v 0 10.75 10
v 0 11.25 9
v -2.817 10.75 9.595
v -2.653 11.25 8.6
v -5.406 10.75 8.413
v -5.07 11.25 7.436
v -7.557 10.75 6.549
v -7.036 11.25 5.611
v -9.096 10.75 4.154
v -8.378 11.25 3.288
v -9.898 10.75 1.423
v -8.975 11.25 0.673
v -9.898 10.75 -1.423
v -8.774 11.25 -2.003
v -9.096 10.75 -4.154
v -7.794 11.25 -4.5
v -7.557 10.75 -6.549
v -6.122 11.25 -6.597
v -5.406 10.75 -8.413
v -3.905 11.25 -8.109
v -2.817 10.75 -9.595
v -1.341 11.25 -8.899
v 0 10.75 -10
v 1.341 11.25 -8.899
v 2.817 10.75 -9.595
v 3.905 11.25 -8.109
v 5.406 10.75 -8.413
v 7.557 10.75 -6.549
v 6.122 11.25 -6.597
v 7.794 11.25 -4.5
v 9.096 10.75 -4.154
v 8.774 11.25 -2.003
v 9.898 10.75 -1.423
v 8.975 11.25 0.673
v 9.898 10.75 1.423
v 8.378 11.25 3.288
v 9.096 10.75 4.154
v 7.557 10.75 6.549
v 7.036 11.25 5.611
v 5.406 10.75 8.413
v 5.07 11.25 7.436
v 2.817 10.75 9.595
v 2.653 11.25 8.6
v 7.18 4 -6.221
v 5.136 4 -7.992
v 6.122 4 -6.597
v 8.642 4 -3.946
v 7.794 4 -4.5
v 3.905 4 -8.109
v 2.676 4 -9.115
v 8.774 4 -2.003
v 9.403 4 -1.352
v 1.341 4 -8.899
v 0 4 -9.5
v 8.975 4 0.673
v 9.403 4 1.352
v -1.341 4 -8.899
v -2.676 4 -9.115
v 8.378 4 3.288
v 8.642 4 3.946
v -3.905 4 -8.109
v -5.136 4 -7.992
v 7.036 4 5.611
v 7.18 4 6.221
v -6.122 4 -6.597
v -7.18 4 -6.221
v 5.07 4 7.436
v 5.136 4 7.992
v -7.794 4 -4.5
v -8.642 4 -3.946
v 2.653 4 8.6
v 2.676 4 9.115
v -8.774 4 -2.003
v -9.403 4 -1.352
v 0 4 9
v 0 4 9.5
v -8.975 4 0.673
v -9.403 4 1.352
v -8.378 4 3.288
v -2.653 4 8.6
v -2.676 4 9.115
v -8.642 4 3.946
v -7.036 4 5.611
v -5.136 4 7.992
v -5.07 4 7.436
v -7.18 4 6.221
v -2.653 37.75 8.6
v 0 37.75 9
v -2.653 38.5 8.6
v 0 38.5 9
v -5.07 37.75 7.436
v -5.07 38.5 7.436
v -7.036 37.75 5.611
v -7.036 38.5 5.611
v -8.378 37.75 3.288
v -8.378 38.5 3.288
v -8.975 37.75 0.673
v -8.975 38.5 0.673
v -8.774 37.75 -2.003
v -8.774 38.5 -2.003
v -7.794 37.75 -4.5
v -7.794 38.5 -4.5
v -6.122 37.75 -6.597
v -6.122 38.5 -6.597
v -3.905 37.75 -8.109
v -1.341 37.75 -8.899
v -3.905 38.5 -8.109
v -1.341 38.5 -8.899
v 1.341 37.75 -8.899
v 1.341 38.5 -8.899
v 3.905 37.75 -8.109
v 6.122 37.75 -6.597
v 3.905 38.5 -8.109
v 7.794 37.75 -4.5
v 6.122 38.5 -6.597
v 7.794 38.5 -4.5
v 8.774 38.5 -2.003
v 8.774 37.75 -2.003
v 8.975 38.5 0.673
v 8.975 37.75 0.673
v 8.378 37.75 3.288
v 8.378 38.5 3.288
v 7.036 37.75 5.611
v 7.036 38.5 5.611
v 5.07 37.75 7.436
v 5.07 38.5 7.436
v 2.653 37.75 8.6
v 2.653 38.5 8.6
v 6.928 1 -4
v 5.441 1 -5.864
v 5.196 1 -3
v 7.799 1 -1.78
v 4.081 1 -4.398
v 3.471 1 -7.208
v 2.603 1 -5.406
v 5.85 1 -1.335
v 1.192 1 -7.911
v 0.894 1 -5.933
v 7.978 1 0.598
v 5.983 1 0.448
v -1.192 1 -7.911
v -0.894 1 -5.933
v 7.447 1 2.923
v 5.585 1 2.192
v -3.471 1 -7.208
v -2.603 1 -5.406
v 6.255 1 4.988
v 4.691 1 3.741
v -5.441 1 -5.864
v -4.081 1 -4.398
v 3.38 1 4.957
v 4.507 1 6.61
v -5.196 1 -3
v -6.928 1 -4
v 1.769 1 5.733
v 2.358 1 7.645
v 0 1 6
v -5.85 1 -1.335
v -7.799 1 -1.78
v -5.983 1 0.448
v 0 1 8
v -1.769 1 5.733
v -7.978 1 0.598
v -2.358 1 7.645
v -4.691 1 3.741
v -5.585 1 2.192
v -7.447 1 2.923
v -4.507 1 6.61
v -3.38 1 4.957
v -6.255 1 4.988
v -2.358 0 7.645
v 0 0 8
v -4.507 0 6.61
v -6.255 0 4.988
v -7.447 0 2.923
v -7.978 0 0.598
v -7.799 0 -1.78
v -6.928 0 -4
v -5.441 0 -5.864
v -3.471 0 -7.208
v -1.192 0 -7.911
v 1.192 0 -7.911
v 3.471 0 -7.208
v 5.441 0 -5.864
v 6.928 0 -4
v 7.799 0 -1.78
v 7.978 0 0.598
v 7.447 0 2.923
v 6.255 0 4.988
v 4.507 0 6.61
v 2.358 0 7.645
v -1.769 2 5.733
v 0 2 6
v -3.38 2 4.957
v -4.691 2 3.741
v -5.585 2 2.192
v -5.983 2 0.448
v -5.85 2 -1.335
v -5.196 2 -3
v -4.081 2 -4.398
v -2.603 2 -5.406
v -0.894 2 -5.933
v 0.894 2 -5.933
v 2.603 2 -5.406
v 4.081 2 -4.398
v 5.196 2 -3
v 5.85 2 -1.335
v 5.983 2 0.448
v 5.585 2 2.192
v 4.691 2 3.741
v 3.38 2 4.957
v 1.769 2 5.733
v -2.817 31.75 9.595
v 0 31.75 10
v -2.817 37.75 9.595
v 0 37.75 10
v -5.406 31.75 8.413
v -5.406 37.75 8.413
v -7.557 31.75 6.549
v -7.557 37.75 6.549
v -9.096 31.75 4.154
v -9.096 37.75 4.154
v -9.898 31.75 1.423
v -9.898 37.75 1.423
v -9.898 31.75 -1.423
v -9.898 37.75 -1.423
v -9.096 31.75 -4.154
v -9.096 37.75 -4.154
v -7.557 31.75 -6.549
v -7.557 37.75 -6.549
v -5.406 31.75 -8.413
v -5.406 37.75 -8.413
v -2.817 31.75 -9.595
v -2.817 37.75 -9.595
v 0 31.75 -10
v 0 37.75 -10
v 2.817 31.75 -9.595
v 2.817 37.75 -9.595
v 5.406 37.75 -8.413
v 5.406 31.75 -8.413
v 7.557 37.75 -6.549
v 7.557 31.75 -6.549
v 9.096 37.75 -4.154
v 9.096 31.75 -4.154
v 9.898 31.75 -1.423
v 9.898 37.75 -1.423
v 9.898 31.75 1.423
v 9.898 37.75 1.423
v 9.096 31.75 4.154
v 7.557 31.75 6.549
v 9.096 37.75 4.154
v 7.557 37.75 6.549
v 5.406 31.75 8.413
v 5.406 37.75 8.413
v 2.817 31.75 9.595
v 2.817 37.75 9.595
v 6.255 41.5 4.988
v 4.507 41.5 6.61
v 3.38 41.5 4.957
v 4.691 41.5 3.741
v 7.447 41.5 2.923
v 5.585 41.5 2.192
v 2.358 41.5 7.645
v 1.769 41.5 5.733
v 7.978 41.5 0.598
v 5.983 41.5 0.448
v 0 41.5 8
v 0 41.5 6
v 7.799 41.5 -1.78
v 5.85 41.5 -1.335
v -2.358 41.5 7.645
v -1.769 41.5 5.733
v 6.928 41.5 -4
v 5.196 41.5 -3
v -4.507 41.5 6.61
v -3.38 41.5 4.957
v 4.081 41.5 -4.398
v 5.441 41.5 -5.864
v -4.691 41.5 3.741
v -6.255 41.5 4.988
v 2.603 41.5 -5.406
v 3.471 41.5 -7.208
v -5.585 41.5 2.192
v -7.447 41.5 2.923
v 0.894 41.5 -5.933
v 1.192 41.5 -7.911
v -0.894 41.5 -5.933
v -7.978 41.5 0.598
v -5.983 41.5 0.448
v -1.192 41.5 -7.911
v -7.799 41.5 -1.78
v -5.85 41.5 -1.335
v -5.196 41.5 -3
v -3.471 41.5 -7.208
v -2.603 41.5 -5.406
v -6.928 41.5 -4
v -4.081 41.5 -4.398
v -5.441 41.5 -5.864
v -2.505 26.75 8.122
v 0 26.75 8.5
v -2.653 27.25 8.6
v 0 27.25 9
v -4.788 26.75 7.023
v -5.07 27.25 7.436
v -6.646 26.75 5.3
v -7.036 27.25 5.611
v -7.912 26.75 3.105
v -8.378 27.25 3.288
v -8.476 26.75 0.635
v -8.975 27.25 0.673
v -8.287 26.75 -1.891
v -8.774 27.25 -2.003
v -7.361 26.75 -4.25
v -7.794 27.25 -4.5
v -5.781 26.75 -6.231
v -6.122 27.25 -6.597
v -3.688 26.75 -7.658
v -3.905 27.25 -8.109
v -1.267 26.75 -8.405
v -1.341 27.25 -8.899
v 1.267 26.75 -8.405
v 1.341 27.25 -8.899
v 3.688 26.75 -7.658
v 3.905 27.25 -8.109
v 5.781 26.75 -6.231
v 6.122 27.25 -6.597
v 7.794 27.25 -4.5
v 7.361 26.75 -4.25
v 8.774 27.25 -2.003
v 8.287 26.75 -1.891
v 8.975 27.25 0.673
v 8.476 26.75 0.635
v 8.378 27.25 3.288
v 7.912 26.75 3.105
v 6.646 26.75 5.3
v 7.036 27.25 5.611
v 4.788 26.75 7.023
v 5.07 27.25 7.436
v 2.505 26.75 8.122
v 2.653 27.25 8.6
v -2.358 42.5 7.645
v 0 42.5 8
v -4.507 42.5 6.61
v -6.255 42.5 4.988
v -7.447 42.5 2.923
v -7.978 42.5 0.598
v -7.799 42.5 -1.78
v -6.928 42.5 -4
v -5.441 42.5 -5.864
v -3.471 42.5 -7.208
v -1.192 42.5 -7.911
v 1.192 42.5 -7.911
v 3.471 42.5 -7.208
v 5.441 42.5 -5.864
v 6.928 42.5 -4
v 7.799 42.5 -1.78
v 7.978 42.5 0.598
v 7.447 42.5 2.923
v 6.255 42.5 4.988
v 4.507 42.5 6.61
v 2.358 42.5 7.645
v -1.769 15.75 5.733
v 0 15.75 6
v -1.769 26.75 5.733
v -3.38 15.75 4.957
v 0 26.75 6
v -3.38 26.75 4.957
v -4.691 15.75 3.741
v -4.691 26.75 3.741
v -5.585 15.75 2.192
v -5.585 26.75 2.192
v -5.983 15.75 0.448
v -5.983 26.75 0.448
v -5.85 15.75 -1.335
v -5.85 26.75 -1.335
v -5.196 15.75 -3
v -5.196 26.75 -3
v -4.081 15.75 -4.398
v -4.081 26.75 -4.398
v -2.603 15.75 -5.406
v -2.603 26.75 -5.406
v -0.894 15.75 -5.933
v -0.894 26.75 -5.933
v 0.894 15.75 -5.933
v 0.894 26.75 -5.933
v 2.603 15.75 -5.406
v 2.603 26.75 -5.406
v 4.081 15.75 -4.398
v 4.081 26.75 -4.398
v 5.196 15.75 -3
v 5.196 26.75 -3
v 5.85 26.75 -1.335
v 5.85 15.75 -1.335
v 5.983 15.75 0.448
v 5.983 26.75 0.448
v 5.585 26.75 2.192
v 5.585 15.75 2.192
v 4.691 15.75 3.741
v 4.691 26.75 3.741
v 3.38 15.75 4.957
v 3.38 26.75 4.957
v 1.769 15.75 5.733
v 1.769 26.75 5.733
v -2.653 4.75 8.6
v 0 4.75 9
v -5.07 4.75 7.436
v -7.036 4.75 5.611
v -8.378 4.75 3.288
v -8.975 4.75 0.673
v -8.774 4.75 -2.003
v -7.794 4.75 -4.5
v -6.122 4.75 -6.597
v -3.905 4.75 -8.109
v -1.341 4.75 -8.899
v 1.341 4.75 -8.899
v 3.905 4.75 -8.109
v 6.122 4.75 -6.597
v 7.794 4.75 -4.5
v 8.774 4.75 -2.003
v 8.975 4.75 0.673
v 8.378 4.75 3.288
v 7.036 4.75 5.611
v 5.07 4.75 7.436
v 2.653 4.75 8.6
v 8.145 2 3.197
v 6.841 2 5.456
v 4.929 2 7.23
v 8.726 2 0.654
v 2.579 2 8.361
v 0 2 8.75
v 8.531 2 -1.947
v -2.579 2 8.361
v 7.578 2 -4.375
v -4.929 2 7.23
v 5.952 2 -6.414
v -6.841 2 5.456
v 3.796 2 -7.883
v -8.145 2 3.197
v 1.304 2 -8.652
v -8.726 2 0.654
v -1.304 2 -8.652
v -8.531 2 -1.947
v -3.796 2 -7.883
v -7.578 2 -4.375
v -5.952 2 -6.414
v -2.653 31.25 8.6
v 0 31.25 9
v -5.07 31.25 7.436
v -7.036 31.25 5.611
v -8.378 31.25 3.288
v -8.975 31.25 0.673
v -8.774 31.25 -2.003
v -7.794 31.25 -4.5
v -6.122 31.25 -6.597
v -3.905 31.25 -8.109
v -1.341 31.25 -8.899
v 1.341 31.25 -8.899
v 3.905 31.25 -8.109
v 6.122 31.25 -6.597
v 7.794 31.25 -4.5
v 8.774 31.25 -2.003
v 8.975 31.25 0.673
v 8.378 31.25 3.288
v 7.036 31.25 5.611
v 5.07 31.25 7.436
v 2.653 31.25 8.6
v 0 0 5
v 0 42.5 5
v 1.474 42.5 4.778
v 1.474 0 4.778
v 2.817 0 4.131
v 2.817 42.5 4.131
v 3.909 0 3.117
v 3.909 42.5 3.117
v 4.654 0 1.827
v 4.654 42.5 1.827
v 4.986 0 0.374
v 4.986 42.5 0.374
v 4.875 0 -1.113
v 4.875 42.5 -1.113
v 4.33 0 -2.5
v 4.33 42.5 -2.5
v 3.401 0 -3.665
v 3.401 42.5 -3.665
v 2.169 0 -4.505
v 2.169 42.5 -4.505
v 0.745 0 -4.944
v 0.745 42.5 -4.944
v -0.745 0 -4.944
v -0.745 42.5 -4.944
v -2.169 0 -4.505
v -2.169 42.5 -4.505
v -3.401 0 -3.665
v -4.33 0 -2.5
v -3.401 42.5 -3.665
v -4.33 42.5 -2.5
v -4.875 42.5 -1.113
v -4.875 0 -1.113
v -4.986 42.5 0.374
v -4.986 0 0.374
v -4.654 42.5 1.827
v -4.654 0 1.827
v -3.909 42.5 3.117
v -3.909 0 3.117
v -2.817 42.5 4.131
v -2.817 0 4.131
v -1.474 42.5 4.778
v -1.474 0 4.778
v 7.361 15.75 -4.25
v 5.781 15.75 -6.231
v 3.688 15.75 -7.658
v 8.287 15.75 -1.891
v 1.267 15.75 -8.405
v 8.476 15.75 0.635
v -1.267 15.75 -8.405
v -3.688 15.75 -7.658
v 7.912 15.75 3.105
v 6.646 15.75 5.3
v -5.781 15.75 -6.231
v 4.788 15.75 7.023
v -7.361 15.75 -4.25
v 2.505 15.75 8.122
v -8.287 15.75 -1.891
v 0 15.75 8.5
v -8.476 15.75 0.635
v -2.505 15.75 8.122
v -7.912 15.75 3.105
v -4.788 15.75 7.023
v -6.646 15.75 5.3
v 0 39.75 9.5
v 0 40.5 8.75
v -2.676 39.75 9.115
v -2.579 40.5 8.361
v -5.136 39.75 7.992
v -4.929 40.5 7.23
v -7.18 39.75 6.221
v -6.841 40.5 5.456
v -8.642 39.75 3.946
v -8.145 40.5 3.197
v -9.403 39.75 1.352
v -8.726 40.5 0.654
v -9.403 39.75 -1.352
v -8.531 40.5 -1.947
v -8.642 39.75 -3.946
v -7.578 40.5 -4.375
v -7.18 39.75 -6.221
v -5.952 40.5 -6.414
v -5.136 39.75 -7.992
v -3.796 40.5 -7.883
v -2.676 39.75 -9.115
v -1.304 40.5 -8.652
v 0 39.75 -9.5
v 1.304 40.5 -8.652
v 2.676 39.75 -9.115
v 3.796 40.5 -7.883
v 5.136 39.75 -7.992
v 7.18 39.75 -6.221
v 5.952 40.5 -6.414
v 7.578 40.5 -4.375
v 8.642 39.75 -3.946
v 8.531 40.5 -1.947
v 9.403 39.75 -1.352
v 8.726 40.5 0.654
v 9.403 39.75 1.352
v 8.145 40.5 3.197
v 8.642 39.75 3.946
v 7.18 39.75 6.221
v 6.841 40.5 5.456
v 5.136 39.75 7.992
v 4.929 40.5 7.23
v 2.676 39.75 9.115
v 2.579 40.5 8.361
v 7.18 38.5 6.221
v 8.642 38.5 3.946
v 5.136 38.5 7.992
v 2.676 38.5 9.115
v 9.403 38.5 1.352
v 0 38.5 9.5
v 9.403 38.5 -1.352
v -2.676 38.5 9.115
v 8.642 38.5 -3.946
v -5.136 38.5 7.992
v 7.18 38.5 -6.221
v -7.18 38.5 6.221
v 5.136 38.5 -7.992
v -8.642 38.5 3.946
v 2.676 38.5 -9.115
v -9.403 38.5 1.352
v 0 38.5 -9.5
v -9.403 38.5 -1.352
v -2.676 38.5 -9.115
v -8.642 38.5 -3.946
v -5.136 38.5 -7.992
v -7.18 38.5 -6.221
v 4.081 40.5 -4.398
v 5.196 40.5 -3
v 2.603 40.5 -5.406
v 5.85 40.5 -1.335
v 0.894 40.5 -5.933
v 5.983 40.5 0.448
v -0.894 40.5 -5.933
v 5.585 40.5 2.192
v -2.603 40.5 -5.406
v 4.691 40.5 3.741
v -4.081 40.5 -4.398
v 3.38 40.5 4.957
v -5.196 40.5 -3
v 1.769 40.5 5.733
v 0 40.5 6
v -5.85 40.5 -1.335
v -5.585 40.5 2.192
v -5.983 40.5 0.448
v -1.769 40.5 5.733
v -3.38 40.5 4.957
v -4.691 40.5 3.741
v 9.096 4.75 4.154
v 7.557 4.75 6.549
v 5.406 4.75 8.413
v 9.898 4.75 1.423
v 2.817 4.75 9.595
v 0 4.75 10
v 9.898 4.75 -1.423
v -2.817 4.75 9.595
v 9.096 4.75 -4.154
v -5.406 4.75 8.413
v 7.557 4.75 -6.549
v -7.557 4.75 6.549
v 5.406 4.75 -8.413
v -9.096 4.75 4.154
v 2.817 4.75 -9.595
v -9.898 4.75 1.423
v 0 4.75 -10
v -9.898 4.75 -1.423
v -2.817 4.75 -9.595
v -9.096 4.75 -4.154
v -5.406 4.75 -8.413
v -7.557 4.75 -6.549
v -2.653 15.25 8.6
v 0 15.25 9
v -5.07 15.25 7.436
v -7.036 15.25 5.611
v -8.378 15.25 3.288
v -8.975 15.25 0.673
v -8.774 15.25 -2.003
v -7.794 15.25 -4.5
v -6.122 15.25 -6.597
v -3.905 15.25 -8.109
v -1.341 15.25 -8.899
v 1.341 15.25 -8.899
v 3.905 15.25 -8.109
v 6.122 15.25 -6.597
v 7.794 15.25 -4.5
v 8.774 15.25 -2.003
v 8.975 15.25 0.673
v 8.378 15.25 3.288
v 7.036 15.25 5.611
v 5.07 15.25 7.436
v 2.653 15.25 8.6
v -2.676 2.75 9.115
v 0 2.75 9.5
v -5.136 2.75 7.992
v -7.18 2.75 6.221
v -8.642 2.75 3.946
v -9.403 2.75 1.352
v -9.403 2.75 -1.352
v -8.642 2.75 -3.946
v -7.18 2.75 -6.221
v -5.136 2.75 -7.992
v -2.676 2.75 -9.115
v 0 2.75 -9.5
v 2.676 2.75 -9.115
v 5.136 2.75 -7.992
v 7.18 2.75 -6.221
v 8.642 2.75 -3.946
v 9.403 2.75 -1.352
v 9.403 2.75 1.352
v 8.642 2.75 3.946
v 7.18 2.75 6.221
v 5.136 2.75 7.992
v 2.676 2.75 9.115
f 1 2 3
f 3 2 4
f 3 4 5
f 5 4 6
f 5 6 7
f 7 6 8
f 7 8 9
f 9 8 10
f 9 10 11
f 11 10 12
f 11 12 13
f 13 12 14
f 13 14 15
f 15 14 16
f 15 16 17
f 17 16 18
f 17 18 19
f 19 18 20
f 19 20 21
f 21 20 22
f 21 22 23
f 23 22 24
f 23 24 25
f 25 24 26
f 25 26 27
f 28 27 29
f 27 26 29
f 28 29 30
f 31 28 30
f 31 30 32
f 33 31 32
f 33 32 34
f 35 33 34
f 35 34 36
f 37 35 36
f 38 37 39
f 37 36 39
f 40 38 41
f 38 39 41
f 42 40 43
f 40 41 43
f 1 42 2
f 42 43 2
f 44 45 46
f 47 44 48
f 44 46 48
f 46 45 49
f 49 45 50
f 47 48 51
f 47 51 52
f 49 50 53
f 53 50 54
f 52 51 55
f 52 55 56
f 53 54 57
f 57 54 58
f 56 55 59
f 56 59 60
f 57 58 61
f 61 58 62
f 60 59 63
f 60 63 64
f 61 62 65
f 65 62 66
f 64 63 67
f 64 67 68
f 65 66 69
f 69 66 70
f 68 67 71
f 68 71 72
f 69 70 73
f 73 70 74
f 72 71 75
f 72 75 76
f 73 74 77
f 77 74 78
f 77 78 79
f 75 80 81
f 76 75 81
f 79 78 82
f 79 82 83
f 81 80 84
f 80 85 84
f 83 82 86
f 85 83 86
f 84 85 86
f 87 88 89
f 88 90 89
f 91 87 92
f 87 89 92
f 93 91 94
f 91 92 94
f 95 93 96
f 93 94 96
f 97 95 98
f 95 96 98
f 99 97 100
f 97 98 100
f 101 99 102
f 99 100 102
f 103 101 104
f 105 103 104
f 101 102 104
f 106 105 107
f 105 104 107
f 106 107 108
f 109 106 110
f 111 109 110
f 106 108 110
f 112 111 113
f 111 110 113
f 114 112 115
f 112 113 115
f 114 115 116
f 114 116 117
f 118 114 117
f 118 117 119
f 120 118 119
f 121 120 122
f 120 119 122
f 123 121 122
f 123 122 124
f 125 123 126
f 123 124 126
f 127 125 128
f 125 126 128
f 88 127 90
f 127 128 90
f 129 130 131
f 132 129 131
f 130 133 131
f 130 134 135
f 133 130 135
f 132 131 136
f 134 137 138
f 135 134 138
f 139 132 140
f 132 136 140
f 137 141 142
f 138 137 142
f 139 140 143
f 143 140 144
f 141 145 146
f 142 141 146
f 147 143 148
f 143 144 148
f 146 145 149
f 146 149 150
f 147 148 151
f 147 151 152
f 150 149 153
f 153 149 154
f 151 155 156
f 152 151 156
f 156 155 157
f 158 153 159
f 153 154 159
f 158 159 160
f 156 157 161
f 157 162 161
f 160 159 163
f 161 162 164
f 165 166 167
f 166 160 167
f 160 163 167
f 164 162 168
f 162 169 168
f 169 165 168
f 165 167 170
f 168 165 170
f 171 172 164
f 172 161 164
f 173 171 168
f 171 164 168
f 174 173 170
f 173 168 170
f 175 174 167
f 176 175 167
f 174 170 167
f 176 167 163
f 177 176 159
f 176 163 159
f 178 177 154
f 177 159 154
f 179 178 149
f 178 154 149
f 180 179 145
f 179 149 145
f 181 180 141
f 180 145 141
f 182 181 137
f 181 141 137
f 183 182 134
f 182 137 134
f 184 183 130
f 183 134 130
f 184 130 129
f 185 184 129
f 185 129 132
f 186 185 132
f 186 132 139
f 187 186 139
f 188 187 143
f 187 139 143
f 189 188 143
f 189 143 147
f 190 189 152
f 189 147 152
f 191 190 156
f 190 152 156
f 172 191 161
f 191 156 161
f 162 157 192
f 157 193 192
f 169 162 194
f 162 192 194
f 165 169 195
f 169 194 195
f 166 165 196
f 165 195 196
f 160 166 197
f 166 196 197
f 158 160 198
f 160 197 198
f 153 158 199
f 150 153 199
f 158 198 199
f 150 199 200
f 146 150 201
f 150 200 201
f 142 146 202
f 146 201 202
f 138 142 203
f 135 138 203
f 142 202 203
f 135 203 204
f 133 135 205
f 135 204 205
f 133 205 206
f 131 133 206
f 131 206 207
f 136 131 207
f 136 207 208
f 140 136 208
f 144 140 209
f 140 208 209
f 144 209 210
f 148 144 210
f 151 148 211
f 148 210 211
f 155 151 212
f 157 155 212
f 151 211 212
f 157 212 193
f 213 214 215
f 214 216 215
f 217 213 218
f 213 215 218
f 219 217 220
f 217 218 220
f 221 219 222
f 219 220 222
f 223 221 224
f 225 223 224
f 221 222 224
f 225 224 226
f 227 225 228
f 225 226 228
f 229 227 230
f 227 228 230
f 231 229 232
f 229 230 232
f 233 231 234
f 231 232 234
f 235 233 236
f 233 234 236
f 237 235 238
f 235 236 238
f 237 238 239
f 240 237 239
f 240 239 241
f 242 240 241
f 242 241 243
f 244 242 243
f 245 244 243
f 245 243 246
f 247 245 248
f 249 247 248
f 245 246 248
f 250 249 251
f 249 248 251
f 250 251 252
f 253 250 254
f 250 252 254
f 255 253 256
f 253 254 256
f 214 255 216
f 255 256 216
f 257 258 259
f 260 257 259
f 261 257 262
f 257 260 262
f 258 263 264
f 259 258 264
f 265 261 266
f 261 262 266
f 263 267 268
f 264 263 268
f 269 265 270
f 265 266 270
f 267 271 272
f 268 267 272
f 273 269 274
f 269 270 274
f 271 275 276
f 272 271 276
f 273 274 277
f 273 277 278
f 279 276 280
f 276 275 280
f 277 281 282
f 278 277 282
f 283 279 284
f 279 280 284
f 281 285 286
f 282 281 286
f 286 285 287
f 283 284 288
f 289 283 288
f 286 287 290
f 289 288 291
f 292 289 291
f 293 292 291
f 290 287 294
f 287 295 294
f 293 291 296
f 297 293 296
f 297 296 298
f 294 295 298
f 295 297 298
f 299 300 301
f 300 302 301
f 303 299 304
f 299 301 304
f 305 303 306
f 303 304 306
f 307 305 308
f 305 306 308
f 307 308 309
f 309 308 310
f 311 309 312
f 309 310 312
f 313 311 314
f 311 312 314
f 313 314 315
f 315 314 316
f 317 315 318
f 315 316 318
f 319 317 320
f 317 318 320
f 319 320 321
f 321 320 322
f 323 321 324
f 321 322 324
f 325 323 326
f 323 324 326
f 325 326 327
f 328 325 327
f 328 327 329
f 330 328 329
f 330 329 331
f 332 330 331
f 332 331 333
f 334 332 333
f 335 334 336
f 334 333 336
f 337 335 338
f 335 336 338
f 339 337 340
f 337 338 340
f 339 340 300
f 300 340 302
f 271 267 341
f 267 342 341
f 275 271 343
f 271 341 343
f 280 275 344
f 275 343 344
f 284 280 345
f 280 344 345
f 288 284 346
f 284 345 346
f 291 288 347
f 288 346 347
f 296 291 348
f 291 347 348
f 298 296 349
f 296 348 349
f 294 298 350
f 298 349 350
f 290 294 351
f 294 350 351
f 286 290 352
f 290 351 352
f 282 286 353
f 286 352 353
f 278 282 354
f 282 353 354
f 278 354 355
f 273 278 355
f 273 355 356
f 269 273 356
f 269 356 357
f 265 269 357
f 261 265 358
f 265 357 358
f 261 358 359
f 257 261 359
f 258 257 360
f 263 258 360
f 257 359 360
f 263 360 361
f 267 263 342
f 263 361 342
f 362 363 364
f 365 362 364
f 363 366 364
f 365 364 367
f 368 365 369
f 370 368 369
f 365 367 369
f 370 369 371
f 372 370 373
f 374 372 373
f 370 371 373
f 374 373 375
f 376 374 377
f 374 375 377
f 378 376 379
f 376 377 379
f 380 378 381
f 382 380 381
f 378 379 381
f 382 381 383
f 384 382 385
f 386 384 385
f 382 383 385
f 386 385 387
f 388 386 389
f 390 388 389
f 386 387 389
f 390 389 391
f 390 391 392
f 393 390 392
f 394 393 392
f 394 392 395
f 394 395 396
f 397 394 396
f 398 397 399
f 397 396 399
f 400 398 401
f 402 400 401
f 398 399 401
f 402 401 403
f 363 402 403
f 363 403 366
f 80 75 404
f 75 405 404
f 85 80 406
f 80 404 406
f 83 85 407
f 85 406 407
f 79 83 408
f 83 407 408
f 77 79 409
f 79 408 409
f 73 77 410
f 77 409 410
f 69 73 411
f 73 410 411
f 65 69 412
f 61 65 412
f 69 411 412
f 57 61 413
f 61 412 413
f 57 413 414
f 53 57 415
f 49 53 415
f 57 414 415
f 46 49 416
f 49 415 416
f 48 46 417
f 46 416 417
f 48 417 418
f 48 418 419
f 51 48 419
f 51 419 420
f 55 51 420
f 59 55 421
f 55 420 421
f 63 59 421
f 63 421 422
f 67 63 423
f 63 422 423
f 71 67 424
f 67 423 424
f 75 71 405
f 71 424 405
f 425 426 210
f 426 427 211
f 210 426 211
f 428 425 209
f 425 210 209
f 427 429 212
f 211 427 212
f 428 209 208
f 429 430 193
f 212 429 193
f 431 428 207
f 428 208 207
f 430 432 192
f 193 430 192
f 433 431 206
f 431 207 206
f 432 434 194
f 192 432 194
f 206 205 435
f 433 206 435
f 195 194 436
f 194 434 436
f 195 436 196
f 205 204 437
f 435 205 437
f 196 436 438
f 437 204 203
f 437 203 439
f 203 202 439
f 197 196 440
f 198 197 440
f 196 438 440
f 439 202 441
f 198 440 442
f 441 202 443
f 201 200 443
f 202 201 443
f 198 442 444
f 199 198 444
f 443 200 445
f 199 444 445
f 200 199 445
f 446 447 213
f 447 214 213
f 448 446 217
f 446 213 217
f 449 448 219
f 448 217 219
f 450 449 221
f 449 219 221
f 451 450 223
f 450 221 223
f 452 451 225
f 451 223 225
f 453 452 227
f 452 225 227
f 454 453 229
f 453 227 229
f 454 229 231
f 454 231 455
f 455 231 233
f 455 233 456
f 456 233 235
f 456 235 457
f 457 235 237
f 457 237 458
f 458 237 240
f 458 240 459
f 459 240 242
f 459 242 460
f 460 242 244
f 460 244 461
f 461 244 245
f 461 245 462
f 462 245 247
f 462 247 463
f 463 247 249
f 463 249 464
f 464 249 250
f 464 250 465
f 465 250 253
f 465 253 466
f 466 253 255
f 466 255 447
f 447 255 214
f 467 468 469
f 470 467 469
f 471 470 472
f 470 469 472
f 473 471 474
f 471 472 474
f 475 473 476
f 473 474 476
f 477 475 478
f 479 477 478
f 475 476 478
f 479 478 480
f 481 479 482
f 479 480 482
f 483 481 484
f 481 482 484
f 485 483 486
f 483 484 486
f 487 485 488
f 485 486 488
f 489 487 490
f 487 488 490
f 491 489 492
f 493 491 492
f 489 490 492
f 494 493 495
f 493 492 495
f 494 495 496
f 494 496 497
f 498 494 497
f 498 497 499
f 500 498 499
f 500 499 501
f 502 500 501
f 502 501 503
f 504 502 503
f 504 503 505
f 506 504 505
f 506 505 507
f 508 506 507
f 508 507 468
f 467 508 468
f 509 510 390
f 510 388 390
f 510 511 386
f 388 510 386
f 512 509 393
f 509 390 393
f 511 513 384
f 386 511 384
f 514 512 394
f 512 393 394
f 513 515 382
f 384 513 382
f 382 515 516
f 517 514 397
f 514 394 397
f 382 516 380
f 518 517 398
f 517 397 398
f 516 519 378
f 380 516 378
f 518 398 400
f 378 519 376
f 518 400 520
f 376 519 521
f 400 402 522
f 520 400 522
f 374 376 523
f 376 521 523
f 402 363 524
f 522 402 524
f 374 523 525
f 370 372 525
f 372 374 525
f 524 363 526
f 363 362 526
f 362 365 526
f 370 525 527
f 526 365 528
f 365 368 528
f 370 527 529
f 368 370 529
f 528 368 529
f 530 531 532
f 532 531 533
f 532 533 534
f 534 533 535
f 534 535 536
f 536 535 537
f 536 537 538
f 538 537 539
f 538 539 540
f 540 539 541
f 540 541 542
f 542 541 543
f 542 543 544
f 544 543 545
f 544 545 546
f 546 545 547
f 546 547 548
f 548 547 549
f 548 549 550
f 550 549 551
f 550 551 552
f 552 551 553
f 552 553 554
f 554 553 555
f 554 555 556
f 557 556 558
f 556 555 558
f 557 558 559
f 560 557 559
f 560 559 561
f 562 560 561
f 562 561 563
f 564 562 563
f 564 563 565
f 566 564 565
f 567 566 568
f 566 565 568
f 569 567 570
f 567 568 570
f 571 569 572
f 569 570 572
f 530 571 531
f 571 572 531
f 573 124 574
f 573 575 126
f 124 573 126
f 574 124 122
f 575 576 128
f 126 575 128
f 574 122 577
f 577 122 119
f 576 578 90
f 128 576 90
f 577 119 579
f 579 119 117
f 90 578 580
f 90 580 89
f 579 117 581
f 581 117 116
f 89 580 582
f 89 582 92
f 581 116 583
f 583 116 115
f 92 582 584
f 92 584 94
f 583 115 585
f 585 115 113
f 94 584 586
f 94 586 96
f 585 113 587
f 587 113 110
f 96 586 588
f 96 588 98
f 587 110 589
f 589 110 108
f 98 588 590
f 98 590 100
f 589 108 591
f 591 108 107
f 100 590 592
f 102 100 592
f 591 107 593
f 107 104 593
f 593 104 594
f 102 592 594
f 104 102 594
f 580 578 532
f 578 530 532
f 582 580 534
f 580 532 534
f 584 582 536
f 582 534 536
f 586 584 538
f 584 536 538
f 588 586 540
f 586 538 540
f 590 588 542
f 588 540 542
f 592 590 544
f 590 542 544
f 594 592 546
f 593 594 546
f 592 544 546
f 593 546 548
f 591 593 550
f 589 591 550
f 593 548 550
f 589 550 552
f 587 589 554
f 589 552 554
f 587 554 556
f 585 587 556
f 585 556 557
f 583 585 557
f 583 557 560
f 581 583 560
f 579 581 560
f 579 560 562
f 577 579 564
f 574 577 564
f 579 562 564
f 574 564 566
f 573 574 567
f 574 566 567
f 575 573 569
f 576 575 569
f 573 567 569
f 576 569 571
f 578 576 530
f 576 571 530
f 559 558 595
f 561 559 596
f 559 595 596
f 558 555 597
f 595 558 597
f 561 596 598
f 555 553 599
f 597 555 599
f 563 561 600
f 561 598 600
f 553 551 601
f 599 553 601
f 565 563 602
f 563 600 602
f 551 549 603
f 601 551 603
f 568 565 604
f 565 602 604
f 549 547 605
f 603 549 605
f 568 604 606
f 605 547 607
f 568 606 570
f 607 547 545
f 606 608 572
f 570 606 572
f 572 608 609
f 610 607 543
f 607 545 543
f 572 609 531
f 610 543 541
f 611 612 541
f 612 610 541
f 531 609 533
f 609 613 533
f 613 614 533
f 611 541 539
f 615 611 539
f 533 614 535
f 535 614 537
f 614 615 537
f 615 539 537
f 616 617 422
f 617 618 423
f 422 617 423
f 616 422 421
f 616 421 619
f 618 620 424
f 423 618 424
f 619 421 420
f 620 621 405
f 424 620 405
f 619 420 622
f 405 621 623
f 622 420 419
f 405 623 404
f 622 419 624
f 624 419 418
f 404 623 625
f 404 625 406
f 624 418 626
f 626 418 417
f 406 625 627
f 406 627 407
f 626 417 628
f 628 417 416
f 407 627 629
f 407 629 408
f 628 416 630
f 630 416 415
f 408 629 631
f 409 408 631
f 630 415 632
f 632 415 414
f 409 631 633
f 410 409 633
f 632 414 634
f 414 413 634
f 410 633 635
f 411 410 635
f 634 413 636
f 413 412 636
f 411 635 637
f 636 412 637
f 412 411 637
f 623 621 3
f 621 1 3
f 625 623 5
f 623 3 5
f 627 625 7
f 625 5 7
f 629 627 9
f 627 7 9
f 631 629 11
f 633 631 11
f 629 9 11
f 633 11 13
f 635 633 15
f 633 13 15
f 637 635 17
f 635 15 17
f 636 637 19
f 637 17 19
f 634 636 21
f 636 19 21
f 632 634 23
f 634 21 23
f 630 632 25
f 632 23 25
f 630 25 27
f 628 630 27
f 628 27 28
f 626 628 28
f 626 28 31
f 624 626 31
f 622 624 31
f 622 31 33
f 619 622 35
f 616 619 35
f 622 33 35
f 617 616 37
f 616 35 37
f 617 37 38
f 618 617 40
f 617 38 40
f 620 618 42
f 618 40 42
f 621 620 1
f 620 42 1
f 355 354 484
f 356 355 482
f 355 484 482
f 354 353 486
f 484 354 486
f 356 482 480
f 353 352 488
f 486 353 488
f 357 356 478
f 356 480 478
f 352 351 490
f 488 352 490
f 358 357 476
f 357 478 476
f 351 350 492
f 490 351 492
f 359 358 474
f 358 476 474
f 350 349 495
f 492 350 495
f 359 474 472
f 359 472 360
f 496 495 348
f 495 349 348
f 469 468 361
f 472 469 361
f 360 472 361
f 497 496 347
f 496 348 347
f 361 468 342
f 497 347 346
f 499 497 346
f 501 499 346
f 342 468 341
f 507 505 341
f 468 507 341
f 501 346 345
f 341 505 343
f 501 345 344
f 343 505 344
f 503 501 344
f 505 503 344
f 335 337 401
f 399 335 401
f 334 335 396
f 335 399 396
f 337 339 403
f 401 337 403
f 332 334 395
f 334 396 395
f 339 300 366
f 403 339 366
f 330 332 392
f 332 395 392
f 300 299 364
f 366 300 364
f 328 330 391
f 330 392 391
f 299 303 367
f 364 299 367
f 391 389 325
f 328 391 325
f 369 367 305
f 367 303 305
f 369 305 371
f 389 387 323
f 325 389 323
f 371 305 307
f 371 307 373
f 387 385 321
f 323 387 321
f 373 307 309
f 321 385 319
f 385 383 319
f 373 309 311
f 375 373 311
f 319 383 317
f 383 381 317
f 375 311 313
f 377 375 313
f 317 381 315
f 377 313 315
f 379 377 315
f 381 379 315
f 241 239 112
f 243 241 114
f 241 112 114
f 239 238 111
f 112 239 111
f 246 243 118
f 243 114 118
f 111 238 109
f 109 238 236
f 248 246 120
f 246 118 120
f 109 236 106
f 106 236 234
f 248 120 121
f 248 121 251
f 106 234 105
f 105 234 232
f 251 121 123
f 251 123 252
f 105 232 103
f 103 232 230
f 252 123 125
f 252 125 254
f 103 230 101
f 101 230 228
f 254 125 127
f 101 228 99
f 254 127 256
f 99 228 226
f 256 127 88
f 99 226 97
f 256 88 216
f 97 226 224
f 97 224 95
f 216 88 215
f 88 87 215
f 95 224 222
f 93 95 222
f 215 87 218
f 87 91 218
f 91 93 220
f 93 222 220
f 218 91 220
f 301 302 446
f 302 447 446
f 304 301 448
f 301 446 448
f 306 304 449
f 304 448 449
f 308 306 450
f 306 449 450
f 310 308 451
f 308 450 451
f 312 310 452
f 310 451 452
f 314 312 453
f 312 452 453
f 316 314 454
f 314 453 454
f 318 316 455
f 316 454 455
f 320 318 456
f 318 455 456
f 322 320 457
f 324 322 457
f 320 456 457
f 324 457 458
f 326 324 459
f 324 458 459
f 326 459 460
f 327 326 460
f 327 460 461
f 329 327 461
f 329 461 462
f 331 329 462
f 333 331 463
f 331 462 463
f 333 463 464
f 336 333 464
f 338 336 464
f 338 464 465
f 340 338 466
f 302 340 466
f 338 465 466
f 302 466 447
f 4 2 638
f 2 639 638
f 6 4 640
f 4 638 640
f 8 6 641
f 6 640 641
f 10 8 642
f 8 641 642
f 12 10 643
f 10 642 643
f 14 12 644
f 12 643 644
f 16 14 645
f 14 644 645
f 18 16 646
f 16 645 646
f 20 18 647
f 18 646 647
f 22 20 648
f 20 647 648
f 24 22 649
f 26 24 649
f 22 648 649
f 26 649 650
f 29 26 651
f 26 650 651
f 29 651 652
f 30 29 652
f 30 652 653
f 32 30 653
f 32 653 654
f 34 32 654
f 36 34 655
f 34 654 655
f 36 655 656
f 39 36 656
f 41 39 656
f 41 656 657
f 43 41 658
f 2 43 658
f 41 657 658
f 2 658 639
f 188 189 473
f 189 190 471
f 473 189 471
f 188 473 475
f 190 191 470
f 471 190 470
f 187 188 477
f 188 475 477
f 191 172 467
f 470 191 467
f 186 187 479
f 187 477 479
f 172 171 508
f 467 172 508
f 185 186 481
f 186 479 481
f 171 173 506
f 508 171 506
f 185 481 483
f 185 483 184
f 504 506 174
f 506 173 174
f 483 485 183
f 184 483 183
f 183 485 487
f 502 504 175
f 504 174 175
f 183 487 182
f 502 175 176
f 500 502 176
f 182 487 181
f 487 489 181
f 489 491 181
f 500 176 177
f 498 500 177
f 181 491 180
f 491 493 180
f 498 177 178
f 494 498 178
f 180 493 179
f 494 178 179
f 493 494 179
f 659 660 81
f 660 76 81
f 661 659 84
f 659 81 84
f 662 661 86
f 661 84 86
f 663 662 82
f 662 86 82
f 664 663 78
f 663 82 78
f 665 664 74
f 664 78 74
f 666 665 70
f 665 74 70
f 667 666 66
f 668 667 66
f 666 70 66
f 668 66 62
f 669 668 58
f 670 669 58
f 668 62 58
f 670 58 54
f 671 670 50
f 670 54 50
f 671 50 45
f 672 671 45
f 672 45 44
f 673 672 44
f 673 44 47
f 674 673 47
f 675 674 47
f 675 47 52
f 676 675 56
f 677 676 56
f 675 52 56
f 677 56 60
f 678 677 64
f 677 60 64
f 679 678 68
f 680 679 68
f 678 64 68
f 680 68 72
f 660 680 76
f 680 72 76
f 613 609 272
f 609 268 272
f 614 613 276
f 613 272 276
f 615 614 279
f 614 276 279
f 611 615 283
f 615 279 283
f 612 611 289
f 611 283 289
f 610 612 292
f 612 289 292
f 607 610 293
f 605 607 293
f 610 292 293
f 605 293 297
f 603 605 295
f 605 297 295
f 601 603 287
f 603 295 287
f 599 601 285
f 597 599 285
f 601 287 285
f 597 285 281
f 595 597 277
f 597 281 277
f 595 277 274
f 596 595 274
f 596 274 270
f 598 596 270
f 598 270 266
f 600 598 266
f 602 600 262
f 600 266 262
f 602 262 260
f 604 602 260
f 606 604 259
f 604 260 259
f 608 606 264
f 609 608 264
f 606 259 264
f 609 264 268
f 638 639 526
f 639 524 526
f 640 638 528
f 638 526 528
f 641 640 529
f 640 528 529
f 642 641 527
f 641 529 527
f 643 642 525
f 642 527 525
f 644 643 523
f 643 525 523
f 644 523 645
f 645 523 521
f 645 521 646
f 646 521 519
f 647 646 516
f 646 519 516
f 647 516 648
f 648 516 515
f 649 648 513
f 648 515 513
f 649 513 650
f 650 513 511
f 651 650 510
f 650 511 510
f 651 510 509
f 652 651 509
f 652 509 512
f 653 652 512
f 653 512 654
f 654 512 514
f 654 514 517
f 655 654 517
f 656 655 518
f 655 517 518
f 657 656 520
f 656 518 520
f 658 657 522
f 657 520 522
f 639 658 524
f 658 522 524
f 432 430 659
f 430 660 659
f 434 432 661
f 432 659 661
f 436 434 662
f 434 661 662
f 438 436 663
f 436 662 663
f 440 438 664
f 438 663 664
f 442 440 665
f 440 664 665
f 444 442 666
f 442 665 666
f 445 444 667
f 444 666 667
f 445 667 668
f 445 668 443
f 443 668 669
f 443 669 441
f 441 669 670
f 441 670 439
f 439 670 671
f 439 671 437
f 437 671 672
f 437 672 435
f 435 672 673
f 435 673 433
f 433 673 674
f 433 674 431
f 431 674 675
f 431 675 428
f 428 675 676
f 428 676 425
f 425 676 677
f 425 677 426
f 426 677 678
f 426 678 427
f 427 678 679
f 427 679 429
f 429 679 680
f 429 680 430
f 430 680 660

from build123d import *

# Parameters (mm, degrees)
SKETCH_2_R          = 5
CUT_EXTRUDE_1_DEPTH = 60


with BuildPart() as part:
    # Эскиз1 → Повернуть1 (revolve)
    with BuildSketch(Plane.XY, mode=Mode.PRIVATE) as revolve_1_sk:
        Polygon((8, 1), (6, 1), (6, 2), (8.75, 2), (9.5, 2.75), (9.5, 4), (9, 4), (9, 4.75), (10, 4.75), (10, 10.75), (9, 11.25), (9, 15.25), (8.5, 15.75), (6, 15.75), (6, 26.75), (8.5, 26.75), (9, 27.25), (9, 31.25), (10, 31.75), (10, 37.75), (9, 37.75), (9, 38.5), (9.5, 38.5), (9.5, 39.75), (8.75, 40.5), (6, 40.5), (6, 41.5), (8, 41.5), (8, 42.5), (0, 42.5), (0, 0), (8, 0), align=None)
    revolve(revolve_1_sk.sketch.rotate(Axis((0, 136.374036199, 0), (0, -1, 0)), 90), axis=Axis((0, 136.374036199, 0), (0, -1, 0)))

    # Эскиз2 → Вырез-Вытянуть1 (cut)
    with BuildSketch(Plane(origin=(0, 42.5, 0), x_dir=(1, 0, 0), z_dir=(0, 1, 0))):
        with Locations(Location((0, 0, 0), (0, 0, 270))):
            Circle(SKETCH_2_R)
    extrude(amount=-CUT_EXTRUDE_1_DEPTH, mode=Mode.SUBTRACT)


solid = part.part
